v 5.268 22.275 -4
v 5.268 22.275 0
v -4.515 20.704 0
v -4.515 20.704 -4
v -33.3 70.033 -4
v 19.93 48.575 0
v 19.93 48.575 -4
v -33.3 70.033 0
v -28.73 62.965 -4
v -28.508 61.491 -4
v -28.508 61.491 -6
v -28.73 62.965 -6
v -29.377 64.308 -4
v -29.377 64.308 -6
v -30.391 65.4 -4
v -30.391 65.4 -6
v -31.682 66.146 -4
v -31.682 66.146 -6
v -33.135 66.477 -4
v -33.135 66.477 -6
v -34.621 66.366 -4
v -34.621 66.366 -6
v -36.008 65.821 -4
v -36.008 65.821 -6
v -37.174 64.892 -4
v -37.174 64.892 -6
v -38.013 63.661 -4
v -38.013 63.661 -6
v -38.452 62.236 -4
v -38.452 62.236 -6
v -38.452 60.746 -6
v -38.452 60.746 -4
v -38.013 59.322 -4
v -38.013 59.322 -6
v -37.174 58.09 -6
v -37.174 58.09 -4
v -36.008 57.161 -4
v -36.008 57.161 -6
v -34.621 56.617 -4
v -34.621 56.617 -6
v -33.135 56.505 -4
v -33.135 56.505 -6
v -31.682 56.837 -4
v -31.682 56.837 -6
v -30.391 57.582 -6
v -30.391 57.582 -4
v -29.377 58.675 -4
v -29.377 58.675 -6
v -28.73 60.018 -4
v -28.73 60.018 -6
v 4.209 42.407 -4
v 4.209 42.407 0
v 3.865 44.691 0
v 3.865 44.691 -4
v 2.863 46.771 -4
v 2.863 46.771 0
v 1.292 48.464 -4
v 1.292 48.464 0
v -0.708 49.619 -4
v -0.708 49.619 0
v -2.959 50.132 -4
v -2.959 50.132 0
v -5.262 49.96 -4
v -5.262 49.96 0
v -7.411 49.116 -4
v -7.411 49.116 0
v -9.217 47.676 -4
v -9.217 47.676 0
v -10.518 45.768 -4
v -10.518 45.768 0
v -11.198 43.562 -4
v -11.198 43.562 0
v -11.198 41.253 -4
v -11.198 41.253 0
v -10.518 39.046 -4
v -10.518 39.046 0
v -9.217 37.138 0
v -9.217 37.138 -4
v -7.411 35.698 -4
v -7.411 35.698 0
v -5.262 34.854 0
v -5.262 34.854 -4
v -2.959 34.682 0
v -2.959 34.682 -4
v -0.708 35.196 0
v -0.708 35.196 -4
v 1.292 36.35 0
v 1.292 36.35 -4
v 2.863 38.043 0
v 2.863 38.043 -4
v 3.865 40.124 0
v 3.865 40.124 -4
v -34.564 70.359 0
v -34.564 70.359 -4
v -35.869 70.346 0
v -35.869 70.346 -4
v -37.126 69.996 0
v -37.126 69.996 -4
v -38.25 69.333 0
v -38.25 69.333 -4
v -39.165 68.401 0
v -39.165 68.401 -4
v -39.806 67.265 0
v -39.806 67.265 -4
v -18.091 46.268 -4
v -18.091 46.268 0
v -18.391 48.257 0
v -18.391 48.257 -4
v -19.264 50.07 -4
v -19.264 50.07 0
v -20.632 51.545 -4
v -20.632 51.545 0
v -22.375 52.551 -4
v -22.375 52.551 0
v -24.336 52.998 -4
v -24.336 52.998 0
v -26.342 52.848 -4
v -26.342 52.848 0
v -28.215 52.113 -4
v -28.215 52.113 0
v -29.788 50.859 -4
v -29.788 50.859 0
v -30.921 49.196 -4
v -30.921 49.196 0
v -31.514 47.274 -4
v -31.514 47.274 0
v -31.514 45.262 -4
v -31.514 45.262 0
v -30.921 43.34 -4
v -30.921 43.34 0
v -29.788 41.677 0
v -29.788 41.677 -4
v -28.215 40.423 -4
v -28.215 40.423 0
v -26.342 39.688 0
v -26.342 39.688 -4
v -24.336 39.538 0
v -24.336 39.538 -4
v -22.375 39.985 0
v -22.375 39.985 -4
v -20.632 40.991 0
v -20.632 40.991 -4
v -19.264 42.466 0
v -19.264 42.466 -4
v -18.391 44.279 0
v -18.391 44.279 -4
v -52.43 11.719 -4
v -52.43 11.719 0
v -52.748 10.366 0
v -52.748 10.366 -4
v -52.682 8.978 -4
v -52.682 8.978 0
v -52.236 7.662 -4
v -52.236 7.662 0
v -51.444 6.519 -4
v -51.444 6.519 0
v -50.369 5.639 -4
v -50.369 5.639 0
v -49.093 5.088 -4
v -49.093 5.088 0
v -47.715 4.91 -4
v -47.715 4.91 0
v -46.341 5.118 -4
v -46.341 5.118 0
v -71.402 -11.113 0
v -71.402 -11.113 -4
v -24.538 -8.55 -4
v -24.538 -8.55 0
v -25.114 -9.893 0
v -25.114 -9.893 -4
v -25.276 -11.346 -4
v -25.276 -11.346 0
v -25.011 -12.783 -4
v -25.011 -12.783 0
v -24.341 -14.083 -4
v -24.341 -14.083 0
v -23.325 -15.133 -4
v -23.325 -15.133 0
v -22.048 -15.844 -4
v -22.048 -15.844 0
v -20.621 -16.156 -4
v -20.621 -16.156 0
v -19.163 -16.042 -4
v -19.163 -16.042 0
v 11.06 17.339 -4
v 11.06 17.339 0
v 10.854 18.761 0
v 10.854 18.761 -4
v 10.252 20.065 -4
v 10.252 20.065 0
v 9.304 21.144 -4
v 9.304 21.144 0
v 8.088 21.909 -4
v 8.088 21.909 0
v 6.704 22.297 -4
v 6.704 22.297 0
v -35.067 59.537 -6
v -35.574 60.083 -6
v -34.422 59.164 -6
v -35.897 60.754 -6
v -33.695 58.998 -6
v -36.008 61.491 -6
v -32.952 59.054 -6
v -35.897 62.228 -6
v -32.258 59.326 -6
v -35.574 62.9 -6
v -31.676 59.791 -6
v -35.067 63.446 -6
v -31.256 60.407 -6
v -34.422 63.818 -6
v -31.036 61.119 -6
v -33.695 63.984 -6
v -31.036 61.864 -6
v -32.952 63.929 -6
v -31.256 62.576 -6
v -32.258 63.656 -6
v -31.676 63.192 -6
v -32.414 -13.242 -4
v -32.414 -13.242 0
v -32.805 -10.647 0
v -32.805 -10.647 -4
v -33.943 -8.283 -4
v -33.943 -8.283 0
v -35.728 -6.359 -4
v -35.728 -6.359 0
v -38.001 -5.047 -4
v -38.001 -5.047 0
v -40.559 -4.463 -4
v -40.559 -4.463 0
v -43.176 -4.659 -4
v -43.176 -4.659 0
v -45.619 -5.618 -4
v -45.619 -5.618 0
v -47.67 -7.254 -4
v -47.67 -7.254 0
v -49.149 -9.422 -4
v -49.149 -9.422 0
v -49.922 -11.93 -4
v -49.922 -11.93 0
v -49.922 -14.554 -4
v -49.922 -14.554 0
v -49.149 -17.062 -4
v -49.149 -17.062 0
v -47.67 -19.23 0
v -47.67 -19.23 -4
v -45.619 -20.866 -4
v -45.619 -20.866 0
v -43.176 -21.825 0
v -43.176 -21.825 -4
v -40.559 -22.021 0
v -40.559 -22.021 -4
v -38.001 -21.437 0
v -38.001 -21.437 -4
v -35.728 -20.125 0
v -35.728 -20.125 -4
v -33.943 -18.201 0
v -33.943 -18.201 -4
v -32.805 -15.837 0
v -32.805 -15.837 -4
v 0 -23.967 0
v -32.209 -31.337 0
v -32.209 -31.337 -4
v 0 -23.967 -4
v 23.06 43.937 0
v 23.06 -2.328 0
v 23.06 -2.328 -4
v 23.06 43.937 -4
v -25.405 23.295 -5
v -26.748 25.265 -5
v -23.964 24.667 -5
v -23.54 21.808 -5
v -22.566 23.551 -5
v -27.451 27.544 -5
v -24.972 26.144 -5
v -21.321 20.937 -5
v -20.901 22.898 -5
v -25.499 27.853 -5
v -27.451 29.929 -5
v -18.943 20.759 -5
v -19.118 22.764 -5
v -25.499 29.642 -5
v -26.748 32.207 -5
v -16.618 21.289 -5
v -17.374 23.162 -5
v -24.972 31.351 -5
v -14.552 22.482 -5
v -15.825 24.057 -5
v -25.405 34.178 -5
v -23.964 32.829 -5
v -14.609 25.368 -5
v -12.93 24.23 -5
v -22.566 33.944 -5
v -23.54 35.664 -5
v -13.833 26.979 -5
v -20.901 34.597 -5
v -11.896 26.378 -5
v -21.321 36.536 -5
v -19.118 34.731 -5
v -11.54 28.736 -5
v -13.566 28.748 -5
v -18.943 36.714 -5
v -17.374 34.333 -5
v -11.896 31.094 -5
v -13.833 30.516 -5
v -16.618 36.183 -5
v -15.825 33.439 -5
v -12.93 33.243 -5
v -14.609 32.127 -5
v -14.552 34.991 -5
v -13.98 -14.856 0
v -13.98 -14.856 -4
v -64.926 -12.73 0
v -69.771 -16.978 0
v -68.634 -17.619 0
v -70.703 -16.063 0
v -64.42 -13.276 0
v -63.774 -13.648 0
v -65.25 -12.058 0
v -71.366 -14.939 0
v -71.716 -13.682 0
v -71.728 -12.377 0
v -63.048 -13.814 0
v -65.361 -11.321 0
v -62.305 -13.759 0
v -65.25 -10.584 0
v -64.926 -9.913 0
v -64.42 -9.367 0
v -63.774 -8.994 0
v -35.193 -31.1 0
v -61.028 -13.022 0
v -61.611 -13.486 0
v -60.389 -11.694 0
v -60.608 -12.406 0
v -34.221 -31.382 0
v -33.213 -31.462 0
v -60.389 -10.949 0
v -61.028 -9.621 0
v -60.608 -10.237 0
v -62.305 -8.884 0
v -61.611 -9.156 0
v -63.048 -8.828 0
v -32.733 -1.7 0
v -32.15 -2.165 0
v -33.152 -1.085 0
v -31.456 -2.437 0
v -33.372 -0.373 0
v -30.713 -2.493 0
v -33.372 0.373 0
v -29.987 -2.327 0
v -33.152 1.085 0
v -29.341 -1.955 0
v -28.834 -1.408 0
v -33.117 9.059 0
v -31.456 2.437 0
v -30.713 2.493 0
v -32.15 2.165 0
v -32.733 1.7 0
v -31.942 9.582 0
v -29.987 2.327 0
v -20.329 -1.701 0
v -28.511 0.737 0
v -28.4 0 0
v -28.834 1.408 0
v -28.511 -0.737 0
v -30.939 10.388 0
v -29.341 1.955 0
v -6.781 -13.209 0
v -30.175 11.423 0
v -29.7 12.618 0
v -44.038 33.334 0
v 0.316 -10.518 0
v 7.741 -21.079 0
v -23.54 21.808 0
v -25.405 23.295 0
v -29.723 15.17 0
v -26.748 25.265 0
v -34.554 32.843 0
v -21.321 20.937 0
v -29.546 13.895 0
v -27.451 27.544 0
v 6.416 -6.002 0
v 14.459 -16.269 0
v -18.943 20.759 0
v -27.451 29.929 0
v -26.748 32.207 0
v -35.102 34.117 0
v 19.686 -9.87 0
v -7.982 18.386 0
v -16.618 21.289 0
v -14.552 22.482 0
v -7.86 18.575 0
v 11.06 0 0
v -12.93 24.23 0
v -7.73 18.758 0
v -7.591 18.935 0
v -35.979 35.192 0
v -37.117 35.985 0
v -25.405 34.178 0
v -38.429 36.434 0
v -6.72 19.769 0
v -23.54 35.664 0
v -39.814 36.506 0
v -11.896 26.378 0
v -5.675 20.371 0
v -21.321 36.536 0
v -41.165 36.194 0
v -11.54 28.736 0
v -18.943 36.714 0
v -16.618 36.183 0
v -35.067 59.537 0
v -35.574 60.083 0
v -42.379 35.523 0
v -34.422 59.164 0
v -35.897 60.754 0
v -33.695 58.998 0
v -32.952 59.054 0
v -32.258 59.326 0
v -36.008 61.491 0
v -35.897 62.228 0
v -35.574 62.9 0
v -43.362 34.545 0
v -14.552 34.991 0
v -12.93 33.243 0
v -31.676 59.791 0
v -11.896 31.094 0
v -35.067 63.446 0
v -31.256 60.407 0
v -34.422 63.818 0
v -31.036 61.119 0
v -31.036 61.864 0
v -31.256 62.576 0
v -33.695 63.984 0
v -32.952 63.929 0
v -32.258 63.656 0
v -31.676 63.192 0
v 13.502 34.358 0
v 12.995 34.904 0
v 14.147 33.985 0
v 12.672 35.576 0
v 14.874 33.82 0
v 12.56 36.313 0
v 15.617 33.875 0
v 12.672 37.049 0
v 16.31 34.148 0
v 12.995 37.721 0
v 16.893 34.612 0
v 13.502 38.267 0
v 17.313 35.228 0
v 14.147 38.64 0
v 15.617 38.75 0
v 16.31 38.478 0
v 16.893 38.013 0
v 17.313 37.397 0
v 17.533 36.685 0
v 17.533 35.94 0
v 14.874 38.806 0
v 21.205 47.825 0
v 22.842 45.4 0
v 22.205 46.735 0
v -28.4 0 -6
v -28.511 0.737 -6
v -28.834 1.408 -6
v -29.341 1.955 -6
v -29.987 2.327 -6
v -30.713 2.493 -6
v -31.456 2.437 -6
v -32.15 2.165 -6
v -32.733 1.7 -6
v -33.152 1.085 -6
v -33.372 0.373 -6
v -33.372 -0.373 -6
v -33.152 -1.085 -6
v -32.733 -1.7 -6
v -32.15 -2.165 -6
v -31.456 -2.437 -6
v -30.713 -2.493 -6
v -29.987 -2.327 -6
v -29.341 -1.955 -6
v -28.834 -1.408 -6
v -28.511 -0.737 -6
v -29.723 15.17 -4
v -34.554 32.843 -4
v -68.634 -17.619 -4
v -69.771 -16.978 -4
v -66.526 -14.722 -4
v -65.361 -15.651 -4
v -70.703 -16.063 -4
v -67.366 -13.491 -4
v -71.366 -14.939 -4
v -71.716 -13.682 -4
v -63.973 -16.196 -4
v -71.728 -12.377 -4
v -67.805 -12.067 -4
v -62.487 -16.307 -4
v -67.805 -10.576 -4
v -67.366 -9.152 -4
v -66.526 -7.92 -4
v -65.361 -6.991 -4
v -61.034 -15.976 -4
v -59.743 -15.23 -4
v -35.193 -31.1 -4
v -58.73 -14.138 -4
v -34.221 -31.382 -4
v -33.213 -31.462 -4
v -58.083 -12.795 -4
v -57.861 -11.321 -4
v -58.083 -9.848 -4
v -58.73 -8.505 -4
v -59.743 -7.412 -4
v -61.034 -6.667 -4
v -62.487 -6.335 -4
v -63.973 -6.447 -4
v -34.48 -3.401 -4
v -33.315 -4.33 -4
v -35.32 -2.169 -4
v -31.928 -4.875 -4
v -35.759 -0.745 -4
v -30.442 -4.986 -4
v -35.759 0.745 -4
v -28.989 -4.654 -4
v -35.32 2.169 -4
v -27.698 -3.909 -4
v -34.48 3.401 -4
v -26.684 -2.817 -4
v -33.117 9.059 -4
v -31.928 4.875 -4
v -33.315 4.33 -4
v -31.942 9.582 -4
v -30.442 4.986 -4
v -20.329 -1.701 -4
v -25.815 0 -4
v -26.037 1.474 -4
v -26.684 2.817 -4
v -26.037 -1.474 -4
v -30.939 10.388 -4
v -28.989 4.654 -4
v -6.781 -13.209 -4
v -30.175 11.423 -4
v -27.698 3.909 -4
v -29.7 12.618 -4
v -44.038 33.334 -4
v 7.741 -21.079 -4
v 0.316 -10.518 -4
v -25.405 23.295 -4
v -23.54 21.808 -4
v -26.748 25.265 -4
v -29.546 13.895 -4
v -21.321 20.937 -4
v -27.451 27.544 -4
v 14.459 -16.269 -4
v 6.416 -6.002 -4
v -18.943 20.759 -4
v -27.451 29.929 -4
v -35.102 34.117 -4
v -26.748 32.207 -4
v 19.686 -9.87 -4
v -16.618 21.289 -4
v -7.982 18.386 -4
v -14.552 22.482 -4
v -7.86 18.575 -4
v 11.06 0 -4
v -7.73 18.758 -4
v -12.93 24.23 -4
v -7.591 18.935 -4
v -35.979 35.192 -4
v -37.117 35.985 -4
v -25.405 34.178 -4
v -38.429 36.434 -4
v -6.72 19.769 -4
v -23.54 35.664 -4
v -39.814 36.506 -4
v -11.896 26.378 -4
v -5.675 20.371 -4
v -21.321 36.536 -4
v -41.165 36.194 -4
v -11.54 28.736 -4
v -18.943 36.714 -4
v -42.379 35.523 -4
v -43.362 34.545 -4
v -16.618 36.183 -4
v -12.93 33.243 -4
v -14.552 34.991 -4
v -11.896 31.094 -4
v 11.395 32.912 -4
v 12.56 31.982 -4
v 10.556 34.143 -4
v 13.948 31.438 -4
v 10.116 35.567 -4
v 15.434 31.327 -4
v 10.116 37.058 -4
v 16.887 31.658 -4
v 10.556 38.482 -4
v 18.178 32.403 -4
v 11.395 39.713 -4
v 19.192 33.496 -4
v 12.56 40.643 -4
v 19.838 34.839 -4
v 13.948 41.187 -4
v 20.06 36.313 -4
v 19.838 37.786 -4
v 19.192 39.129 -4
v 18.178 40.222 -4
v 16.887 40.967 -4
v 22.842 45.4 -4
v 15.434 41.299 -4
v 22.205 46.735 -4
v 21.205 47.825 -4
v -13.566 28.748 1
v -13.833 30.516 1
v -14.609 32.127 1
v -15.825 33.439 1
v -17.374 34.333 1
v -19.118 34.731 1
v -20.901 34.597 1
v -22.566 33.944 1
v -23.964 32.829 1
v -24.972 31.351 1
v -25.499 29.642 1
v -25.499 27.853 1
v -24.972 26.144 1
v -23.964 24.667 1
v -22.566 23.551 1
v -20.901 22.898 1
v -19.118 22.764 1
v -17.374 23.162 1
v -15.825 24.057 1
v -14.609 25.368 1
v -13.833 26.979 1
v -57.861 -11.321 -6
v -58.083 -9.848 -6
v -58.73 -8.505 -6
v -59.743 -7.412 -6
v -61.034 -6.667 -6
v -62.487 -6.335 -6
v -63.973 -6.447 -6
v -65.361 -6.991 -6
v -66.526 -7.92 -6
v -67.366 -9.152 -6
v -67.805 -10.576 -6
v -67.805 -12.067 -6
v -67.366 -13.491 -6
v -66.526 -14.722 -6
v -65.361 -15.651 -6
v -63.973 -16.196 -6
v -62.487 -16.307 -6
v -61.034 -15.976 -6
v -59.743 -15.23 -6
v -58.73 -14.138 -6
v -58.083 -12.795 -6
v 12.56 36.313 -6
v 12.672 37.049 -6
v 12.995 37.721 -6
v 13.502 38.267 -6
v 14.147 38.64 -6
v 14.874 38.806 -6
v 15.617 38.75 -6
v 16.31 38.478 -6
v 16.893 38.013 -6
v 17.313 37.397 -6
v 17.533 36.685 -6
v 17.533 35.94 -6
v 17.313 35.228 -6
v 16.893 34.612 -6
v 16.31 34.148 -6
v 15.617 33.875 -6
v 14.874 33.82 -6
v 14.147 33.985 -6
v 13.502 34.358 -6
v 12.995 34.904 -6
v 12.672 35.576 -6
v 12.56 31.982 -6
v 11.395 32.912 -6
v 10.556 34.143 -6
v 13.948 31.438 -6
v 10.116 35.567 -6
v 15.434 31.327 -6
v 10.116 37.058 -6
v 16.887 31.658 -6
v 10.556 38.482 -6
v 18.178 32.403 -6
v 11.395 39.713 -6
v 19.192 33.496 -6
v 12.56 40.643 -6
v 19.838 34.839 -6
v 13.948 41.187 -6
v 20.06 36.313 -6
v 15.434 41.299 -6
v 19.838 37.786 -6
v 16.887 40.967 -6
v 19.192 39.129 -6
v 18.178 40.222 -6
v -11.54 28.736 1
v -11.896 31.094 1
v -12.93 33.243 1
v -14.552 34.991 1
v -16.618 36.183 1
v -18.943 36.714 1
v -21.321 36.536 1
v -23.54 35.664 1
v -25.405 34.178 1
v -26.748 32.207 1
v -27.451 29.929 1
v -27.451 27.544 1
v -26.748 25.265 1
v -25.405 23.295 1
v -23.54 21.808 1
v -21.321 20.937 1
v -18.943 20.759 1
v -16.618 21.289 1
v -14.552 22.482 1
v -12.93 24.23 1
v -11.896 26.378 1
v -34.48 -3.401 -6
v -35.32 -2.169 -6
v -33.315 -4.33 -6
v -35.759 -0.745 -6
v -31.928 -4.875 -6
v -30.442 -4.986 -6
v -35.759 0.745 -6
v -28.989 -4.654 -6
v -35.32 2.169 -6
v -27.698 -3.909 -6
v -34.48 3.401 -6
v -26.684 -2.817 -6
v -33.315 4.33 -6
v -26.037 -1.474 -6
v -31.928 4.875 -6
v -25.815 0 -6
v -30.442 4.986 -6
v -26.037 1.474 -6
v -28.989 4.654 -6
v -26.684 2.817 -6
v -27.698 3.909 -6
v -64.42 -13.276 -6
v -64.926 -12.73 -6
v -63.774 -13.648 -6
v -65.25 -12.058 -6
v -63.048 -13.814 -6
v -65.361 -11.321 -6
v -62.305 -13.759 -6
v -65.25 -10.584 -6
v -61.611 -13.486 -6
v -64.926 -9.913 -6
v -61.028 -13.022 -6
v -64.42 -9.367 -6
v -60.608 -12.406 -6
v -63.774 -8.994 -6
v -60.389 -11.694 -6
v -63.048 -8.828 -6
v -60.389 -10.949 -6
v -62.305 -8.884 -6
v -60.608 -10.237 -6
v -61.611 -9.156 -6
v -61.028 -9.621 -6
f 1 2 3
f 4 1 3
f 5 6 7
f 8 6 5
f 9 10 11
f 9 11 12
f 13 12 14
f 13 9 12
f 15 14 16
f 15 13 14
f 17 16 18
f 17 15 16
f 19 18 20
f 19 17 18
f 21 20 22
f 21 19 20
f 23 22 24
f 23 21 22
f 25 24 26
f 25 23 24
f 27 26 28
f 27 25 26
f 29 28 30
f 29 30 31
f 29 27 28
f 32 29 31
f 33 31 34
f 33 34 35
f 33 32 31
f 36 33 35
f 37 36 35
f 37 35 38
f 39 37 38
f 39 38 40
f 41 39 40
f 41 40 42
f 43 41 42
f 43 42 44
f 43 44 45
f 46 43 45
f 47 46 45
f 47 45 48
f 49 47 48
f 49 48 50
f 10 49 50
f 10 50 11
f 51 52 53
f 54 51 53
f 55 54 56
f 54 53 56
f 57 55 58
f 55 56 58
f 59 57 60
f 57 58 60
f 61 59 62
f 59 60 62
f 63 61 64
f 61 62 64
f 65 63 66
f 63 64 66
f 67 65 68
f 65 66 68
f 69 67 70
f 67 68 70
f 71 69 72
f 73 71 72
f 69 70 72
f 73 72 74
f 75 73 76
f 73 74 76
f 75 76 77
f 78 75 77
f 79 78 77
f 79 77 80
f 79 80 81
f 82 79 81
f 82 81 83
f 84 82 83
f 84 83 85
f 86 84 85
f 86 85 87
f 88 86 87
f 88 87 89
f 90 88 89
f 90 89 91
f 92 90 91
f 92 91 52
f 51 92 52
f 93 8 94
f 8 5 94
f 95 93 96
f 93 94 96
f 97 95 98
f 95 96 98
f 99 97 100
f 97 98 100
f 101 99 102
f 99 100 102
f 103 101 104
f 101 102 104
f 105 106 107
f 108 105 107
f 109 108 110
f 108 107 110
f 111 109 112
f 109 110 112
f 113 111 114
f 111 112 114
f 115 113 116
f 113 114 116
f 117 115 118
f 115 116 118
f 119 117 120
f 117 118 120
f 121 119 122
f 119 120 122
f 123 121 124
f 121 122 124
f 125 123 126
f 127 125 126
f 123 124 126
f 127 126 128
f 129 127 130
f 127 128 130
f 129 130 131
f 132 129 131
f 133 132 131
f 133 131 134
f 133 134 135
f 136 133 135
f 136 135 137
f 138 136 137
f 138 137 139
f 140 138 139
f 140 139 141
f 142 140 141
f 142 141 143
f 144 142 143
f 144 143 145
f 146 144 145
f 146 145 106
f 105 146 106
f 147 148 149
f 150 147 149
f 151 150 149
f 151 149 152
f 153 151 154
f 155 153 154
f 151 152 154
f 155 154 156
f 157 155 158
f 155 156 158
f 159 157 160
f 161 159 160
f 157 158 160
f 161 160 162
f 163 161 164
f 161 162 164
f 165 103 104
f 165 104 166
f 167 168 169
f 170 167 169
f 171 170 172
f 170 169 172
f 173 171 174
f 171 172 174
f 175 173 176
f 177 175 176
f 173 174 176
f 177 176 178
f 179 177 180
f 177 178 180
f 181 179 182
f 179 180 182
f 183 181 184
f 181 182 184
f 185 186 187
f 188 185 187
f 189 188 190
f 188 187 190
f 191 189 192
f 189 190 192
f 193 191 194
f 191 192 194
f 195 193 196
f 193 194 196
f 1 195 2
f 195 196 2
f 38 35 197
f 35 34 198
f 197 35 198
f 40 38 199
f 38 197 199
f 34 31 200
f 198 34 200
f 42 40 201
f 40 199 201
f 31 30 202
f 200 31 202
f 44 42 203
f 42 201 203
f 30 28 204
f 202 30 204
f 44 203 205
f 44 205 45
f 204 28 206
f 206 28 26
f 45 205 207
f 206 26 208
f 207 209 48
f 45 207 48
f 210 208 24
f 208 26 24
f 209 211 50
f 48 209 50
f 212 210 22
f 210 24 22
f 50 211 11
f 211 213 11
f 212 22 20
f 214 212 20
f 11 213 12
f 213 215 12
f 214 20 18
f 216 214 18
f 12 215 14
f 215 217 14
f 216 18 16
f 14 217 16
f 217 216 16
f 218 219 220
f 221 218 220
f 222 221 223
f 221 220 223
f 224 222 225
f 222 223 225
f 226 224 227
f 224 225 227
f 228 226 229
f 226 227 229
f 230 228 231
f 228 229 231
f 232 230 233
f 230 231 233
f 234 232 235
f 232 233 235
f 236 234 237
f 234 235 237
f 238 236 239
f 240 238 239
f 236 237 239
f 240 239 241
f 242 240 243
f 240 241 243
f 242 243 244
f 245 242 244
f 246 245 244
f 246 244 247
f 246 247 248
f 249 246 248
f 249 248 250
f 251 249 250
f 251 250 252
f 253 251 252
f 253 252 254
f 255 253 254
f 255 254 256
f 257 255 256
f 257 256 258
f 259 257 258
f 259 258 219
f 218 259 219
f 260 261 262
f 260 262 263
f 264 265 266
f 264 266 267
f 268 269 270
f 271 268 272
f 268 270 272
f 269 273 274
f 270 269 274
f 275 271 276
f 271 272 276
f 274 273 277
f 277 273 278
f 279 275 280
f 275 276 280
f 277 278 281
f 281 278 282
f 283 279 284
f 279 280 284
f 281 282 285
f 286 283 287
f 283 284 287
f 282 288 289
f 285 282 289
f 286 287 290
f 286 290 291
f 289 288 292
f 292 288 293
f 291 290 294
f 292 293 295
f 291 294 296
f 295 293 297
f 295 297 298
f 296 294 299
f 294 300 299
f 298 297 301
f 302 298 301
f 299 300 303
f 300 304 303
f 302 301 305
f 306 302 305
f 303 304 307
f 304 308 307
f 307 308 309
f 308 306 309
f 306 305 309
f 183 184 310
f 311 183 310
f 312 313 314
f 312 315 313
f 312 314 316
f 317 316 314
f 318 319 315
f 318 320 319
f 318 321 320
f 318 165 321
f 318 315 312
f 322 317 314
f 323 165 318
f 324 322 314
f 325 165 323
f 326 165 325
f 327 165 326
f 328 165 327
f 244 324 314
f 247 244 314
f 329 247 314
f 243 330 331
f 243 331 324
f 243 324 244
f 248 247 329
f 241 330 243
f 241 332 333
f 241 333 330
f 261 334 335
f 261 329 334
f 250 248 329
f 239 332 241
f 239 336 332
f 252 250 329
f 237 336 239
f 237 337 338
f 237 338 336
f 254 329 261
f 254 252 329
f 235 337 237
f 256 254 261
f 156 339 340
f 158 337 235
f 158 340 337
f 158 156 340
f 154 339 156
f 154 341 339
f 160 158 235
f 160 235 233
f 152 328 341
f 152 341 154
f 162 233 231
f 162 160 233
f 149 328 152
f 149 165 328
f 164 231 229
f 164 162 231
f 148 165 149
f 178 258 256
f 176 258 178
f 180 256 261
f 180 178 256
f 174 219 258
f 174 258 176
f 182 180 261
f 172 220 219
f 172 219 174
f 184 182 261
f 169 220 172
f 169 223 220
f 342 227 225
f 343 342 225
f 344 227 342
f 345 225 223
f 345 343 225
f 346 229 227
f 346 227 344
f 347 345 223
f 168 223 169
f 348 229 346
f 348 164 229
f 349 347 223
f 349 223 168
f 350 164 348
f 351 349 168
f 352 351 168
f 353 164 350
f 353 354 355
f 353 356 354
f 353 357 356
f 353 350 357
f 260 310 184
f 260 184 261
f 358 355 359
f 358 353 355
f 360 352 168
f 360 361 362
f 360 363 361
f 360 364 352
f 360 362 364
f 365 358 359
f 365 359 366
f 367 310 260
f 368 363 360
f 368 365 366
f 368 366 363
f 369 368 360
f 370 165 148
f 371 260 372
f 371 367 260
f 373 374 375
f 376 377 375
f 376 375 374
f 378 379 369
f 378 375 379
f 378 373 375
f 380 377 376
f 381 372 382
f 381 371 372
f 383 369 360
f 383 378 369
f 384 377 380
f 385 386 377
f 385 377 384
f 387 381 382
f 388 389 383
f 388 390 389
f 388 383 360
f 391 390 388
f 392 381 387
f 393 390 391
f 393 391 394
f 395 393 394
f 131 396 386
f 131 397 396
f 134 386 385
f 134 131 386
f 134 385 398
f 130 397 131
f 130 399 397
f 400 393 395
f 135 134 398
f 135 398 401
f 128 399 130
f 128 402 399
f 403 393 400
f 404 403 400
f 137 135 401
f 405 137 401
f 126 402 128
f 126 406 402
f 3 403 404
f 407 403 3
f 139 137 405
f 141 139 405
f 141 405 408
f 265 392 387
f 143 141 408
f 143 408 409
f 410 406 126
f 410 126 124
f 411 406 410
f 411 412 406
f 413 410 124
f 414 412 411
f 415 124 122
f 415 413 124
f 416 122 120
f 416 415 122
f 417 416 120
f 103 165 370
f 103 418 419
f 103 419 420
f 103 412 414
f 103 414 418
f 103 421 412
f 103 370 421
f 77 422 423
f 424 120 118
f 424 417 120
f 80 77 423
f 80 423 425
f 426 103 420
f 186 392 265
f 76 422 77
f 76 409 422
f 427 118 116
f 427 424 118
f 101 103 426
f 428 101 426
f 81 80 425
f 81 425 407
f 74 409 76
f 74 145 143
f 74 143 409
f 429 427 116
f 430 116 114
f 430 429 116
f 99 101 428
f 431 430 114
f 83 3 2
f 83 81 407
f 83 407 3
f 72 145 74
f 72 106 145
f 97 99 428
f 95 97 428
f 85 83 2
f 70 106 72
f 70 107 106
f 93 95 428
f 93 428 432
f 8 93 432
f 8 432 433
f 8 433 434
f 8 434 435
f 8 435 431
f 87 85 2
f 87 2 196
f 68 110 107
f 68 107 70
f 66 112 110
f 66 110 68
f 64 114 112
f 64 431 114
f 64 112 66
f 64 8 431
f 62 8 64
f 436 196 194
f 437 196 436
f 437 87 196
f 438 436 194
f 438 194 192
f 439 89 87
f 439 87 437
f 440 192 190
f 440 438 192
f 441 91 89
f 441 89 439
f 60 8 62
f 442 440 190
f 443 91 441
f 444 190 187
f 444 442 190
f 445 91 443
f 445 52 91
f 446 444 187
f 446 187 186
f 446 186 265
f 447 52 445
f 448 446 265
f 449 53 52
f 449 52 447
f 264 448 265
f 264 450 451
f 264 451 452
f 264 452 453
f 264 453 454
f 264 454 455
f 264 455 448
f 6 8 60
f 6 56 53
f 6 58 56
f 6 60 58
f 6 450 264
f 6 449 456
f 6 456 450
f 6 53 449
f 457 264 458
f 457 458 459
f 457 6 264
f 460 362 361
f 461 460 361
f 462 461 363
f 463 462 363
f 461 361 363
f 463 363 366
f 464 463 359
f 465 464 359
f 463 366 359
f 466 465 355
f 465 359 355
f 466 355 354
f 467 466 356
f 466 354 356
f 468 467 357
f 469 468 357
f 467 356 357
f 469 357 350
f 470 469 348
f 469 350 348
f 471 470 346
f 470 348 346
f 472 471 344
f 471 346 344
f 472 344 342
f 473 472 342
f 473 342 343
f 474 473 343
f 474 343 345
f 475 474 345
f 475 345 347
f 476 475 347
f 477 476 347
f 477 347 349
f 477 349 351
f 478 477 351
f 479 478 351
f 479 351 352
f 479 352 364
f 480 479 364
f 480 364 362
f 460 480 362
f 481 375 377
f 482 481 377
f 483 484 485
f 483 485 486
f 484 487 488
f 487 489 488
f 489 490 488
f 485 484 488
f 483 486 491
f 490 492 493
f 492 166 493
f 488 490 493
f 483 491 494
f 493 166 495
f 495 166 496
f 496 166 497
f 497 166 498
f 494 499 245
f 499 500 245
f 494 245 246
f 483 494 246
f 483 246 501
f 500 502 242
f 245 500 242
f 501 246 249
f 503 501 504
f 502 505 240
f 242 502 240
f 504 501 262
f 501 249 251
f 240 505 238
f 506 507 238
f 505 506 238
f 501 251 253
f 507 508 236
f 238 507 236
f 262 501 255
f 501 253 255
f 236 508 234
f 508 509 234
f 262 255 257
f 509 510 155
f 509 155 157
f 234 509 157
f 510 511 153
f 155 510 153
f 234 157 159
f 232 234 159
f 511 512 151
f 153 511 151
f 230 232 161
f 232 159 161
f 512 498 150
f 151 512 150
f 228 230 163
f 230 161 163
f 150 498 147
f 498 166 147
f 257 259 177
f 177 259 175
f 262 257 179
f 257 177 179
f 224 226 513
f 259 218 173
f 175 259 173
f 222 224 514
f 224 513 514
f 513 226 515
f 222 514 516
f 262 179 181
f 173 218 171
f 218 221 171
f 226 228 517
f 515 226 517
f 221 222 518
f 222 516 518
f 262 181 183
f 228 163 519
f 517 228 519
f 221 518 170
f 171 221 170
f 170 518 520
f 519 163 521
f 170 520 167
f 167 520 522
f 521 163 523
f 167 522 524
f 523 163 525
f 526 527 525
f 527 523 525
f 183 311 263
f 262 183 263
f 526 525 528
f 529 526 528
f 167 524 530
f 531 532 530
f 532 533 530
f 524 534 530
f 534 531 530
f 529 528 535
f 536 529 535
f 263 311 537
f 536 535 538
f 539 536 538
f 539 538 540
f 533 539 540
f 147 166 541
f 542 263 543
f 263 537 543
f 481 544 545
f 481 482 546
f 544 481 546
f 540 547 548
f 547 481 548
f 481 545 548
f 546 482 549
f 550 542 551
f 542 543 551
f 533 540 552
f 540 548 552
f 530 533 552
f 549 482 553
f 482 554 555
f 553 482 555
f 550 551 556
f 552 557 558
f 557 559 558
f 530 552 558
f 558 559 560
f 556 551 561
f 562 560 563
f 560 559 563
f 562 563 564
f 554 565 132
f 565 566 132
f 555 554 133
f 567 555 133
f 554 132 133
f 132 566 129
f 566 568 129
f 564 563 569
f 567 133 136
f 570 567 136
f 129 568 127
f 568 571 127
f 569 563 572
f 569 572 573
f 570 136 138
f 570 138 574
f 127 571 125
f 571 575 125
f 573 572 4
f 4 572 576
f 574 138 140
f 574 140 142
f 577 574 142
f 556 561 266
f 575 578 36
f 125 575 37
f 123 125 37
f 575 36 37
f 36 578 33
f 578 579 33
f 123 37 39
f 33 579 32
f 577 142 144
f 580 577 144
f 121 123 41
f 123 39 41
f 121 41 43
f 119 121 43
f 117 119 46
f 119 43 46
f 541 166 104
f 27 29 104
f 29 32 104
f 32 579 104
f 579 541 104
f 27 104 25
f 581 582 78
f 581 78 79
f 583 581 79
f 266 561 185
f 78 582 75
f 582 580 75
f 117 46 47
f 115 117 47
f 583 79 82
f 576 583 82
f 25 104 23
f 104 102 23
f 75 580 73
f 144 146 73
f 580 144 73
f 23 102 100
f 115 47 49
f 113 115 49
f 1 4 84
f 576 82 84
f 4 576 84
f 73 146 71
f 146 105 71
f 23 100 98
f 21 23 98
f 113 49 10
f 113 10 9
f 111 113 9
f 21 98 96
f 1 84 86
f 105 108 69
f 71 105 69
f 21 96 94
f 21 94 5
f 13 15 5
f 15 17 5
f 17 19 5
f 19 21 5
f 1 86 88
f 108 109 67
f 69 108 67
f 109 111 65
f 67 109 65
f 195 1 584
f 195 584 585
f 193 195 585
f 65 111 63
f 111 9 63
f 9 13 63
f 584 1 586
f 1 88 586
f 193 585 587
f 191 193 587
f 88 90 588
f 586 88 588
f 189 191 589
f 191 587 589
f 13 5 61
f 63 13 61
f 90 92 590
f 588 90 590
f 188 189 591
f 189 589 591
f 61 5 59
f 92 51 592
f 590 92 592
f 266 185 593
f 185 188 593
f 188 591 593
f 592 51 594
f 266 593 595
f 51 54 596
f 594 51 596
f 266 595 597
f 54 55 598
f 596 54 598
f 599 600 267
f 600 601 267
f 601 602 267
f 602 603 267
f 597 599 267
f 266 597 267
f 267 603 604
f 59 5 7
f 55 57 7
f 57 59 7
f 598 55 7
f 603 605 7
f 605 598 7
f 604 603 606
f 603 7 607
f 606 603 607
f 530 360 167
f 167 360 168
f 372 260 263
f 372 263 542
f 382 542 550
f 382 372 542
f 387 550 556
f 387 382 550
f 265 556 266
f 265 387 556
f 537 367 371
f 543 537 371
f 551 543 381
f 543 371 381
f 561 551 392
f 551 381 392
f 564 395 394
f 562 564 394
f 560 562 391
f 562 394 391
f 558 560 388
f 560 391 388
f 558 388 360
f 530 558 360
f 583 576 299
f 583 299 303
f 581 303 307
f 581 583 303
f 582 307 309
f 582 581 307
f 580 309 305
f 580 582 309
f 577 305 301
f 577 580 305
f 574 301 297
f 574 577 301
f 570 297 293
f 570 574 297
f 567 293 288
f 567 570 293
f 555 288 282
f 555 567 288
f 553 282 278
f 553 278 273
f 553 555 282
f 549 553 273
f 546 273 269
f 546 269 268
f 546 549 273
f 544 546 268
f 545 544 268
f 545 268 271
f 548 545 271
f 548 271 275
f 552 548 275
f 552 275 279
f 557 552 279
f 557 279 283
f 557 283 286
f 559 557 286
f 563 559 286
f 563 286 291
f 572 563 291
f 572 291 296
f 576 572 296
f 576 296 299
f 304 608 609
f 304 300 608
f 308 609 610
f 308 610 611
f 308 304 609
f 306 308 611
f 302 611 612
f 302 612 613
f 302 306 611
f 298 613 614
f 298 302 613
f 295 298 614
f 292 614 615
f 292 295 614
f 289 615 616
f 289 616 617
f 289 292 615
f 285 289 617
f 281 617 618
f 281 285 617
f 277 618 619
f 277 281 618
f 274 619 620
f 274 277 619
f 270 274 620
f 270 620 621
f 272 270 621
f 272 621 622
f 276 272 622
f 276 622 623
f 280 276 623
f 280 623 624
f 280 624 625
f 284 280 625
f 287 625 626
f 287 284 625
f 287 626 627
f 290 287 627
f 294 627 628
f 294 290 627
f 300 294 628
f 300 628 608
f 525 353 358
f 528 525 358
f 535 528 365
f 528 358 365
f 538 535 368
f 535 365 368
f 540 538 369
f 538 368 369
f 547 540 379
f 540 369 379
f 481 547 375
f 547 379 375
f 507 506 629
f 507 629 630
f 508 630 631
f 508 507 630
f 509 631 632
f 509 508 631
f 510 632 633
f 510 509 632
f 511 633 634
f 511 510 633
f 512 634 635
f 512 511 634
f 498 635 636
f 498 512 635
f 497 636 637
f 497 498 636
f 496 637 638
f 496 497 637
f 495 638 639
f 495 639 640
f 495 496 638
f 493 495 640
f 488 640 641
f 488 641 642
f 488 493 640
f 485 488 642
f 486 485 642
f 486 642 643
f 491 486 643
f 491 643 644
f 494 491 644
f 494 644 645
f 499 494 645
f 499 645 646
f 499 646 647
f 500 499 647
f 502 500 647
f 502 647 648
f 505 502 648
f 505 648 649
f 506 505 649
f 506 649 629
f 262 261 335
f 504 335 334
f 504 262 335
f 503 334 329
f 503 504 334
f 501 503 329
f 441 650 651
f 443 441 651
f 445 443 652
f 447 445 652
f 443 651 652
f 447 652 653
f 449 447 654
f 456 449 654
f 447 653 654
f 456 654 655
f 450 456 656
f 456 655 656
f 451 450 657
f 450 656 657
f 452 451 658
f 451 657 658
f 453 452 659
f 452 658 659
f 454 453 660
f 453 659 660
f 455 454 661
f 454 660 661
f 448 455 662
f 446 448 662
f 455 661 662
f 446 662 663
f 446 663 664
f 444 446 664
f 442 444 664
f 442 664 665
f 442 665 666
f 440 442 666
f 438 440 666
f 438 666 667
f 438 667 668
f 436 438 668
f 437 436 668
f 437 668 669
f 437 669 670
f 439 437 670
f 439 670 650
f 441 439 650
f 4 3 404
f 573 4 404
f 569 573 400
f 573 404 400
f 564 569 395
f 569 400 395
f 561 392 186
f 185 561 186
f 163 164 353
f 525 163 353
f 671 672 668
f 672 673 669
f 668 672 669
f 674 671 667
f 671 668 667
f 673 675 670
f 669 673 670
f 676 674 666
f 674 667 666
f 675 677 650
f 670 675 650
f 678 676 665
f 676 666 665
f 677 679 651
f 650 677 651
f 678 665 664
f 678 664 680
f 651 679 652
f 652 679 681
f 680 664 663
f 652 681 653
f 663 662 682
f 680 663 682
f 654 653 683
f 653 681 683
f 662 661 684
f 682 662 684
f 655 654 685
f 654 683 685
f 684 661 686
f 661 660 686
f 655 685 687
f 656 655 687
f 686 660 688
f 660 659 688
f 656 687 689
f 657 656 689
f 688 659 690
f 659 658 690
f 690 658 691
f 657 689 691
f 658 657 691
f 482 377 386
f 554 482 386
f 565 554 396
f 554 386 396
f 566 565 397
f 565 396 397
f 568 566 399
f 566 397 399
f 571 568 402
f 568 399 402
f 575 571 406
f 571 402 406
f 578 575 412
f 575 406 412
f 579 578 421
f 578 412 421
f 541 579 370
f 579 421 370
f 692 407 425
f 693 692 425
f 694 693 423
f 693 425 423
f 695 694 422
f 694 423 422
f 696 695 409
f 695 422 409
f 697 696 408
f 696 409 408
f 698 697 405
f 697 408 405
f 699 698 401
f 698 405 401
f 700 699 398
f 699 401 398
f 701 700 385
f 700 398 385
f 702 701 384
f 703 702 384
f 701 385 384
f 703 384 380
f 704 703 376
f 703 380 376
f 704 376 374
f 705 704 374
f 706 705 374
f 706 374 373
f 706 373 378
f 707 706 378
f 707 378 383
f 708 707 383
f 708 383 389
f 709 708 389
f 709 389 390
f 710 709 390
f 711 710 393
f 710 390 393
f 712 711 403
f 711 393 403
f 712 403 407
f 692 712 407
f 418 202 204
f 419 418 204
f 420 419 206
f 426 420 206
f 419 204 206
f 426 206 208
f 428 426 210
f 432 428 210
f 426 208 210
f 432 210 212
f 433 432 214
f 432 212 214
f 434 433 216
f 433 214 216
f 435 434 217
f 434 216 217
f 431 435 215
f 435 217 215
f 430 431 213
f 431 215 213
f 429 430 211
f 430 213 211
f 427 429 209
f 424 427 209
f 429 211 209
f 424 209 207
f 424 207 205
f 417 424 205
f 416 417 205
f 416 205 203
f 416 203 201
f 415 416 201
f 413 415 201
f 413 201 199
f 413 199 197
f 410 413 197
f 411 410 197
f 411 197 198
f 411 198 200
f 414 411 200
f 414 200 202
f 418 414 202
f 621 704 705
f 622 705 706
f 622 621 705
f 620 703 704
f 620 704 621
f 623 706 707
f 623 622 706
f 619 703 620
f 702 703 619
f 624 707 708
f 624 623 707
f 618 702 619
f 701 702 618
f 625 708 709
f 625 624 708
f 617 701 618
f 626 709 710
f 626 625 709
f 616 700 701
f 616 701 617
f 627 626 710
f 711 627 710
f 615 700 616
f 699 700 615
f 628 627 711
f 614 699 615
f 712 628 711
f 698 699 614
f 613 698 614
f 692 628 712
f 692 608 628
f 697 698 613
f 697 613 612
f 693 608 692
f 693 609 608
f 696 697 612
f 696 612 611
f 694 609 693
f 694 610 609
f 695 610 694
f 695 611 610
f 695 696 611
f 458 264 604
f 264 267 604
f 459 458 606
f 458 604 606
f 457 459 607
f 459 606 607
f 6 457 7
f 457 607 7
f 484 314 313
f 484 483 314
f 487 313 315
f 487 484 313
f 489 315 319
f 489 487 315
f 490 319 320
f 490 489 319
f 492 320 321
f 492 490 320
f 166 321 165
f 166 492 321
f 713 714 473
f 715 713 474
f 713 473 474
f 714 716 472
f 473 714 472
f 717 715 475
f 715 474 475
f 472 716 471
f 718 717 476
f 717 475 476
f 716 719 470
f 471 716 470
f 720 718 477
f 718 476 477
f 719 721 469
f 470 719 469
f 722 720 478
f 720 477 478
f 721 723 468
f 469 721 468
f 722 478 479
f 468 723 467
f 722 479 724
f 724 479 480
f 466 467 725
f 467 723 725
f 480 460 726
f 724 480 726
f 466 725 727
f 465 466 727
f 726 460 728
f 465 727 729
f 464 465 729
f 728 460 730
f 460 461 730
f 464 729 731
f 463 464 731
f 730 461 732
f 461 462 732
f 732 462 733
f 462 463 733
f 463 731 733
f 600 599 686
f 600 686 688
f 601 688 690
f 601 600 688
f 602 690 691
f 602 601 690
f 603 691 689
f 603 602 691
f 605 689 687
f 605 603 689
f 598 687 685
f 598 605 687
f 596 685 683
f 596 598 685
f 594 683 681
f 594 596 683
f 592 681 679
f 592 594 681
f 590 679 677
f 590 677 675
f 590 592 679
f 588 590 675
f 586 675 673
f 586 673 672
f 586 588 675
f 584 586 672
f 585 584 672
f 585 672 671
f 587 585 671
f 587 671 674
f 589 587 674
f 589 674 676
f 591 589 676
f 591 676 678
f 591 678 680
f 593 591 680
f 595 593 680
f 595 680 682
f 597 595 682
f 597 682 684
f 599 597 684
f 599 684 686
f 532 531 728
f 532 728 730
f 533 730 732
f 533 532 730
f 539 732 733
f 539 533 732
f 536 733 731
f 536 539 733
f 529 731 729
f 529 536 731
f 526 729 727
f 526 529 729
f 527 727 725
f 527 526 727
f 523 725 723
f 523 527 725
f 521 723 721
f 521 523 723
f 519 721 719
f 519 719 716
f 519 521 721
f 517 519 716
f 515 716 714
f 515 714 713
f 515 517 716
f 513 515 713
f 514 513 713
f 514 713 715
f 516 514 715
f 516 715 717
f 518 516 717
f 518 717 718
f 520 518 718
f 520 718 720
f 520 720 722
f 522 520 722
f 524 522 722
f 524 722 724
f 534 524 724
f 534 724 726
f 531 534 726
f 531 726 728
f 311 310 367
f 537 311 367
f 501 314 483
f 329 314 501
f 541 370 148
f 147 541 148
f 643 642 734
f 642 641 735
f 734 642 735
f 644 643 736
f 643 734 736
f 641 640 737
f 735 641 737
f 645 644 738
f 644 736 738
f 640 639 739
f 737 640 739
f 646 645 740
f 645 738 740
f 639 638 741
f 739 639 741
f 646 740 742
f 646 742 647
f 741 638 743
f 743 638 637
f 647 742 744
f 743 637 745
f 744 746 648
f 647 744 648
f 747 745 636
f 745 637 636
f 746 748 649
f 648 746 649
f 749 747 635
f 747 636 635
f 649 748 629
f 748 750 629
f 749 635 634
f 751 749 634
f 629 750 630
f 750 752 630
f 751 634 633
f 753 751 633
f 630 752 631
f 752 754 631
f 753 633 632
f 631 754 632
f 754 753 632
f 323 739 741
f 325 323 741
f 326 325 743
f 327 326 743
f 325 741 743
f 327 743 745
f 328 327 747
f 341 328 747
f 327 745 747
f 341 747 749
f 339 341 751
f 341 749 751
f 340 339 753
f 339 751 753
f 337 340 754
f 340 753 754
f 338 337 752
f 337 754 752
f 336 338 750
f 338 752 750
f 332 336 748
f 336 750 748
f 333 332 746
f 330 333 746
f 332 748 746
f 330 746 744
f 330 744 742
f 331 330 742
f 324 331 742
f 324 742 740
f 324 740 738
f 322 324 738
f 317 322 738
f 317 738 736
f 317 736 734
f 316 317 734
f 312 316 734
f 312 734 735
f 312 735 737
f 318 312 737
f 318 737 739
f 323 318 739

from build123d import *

# Parameters (mm, degrees)
F0_R          = 20.4
F0_R_2        = 18.9
F1_DEPTH      = 4
F0_R_3        = 2.5
F0_R_4        = 8
F2_DEPTH      = 4
F3_DEPTH      = 4
F4_R          = 5
F4_R_2        = 2.5
F5_DEPTH      = 6
F4_R_3        = 1.5
F6_DEPTH      = 6
F4_R_4        = 8
F4_R_5        = 6
F7_DEPTH      = 5
F7_DEPTH_BACK = 1
F8_R          = 5
F9_D          = 5
F4_R_6        = 6.7492124295
F4_R_7        = 8.8034997794
F4_R_8        = 7.7469148922
F10_DEPTH     = 6.001


with BuildPart() as f1:
    # F0 (on Top) → F1 (new body)
    with BuildSketch(Plane.XY):
        Circle(F0_R)
        Circle(F0_R_2, mode=Mode.SUBTRACT)
    extrude(amount=-F1_DEPTH)

    # F0 (on Top) → F2 (join)
    with BuildSketch(Plane.XY):
        with BuildLine():
            Line((-37.9369594157, 71.9021782279), (-73.2717439532, -15.7500002533))
            Line((-73.2717439532, -15.7500002533), (-33.7380266771, -31.6870300696))
            Line((-33.7380266771, -31.6870300696), (0, -23.96739088))
            ThreePointArc((0, -23.96739088), (14.4587631047, -16.2687135057), (23.0604634443, -2.3282610346))
            Line((23.0604634443, -2.3282610346), (23.0604634443, 47.3125920767))
            Line((23.0604634443, 47.3125920767), (-37.9369594157, 71.9021782279))
        make_face()
        with Locations((-30.9, 0)):
            Circle(F0_R_3, mode=Mode.SUBTRACT)
        Circle(F0_R, mode=Mode.SUBTRACT)
        with Locations((-19.5403950401, 28.736203214)):
            Circle(F0_R_4, mode=Mode.SUBTRACT)
    extrude(amount=-F2_DEPTH)

    # F0 (on Top) → F3 (join)
    with BuildSketch(Plane.XY):
        Circle(F0_R_2)
    extrude(amount=-F3_DEPTH)

    # F4 (on face) → F5 (join)
    with BuildSketch(Plane.XY):
        with Locations((-30.8152195066, 0)):
            Circle(F4_R)
        with Locations((-30.9, 0)):
            Circle(F4_R_2, mode=Mode.SUBTRACT)
    extrude(amount=-F5_DEPTH)

    # F4 (on face) → F6 (join)
    with BuildSketch(Plane.XY):
        with Locations((15.0604634443, 36.3125920767)):
            Circle(F4_R)
        with Locations((15.0604634443, 36.3125920767)):
            Circle(F4_R_3, mode=Mode.SUBTRACT)
        with Locations((-33.5082715717, 61.4912837428)):
            Circle(F4_R)
        with Locations((-33.5082715717, 61.4912837428)):
            Circle(F4_R_3, mode=Mode.SUBTRACT)
        with Locations((-62.8608494681, -11.3213124094)):
            Circle(F4_R)
        with Locations((-62.8608494681, -11.3213124094)):
            Circle(F4_R_3, mode=Mode.SUBTRACT)
    extrude(amount=-F6_DEPTH)

    # F4 (on face) → F7 (join, two sides)
    with BuildSketch(Plane.XY) as f7_sk:
        with Locations((-19.5403950401, 28.736203214)):
            Circle(F4_R_4)
        with Locations((-19.5659566671, 28.7475492805)):
            Circle(F4_R_5, mode=Mode.SUBTRACT)
    extrude(amount=-F7_DEPTH)
    extrude(f7_sk.sketch, amount=F7_DEPTH_BACK)

    # F8
    f8_edges = [f1.edges().sort_by_distance(p)[0] for p in [
        (-73.271744, -15.75, -2),
        (-37.936959, 71.902178, -2),
        (23.060463, 47.312592, -2),
        (-33.738027, -31.68703, -2),
    ]]
    fillet(f8_edges, radius=F8_R)

    # F9 (through all)
    with Locations(Plane.XY):
        with Locations((-33.5082715717, 61.4912837428), (15.0604634443, 36.3125920767), (-62.8608494681, -11.3213124094)):
            Hole(F9_D / 2)

    # F4 (on face) → F10 (cut, through all)
    with BuildSketch(Plane.XY):
        with Locations((-24.8405560851, 46.2679713964)):
            Circle(F4_R_6)
        with BuildLine():
            ThreePointArc((-34.5543373603, 32.8433099638), (-39.1188131875, 36.5180985692), (-44.0384065292, 33.3343724152))
            Line((-44.0384065292, 33.3343724152), (-52.4302117947, 11.7191193495))
            ThreePointArc((-52.4302117947, 11.7191193495), (-51.444320935, 6.5193730929), (-46.340876706, 5.1178742801))
            Line((-46.340876706, 5.1178742801), (-33.1174276827, 9.0594797734))
            ThreePointArc((-33.1174276827, 9.0594797734), (-30.1749819218, 11.422822336), (-29.7226936025, 15.1696623914))
            Line((-29.7226936025, 15.1696623914), (-34.5543373603, 32.8433099638))
        make_face()
        with BuildLine():
            Line((5.2675922587, 22.2754651912), (-4.5154558015, 20.7042452523))
            ThreePointArc((-4.5154558015, 20.7042452523), (-6.2156561453, 20.1016297559), (-7.5913755862, 18.9349152813))
            ThreePointArc((-7.5913755862, 18.9349152813), (1.9526532516, 20.3063326398), (11.0604634443, 17.1413578341))
            Line((11.0604634443, 17.1413578341), (11.0604634443, 17.3387299053))
            ThreePointArc((11.0604634443, 17.3387299053), (9.3035826274, 21.1442755907), (5.2675922587, 22.2754651912))
        make_face()
        with BuildLine():
            ThreePointArc((11.0604634443, 17.1413578341), (1.9526532516, 20.3063326398), (-7.5913755862, 18.9349152813))
            ThreePointArc((-7.5913755862, 18.9349152813), (-7.7960820291, 18.6669269466), (-7.9822585437, 18.3857494569))
            Line((-7.9822585437, 18.3857494569), (-20.3289314836, -1.7013361619))
            ThreePointArc((-20.3289314836, -1.7013361619), (-18.3724422175, -8.866417933), (-13.9804985925, -14.8561656932))
            Line((-13.9804985925, -14.8561656932), (-6.7808091525, -13.2087959378))
            ThreePointArc((-6.7808091525, -13.2087959378), (3.5211433289, -8.4701576249), (11.0604634443, 0))
            Line((11.0604634443, 0), (11.0604634443, 17.1413578341))
        make_face()
        with BuildLine():
            ThreePointArc((-13.9804985925, -14.8561656932), (-18.3724422175, -8.866417933), (-20.3289314836, -1.7013361619))
            Line((-20.3289314836, -1.7013361619), (-24.5383981985, -8.5498141869))
            ThreePointArc((-24.5383981985, -8.5498141869), (-24.341412043, -14.0825979067), (-19.1634895492, -16.0420921996))
            Line((-19.1634895492, -16.0420921996), (-13.9804985925, -14.8561656932))
        make_face()
        with Locations((-41.2170253694, -13.2419364527)):
            Circle(F4_R_7)
        with Locations((-3.5378288012, 42.4071475863)):
            Circle(F4_R_8)
    extrude(amount=-F10_DEPTH, mode=Mode.SUBTRACT)


solid = f1.part
